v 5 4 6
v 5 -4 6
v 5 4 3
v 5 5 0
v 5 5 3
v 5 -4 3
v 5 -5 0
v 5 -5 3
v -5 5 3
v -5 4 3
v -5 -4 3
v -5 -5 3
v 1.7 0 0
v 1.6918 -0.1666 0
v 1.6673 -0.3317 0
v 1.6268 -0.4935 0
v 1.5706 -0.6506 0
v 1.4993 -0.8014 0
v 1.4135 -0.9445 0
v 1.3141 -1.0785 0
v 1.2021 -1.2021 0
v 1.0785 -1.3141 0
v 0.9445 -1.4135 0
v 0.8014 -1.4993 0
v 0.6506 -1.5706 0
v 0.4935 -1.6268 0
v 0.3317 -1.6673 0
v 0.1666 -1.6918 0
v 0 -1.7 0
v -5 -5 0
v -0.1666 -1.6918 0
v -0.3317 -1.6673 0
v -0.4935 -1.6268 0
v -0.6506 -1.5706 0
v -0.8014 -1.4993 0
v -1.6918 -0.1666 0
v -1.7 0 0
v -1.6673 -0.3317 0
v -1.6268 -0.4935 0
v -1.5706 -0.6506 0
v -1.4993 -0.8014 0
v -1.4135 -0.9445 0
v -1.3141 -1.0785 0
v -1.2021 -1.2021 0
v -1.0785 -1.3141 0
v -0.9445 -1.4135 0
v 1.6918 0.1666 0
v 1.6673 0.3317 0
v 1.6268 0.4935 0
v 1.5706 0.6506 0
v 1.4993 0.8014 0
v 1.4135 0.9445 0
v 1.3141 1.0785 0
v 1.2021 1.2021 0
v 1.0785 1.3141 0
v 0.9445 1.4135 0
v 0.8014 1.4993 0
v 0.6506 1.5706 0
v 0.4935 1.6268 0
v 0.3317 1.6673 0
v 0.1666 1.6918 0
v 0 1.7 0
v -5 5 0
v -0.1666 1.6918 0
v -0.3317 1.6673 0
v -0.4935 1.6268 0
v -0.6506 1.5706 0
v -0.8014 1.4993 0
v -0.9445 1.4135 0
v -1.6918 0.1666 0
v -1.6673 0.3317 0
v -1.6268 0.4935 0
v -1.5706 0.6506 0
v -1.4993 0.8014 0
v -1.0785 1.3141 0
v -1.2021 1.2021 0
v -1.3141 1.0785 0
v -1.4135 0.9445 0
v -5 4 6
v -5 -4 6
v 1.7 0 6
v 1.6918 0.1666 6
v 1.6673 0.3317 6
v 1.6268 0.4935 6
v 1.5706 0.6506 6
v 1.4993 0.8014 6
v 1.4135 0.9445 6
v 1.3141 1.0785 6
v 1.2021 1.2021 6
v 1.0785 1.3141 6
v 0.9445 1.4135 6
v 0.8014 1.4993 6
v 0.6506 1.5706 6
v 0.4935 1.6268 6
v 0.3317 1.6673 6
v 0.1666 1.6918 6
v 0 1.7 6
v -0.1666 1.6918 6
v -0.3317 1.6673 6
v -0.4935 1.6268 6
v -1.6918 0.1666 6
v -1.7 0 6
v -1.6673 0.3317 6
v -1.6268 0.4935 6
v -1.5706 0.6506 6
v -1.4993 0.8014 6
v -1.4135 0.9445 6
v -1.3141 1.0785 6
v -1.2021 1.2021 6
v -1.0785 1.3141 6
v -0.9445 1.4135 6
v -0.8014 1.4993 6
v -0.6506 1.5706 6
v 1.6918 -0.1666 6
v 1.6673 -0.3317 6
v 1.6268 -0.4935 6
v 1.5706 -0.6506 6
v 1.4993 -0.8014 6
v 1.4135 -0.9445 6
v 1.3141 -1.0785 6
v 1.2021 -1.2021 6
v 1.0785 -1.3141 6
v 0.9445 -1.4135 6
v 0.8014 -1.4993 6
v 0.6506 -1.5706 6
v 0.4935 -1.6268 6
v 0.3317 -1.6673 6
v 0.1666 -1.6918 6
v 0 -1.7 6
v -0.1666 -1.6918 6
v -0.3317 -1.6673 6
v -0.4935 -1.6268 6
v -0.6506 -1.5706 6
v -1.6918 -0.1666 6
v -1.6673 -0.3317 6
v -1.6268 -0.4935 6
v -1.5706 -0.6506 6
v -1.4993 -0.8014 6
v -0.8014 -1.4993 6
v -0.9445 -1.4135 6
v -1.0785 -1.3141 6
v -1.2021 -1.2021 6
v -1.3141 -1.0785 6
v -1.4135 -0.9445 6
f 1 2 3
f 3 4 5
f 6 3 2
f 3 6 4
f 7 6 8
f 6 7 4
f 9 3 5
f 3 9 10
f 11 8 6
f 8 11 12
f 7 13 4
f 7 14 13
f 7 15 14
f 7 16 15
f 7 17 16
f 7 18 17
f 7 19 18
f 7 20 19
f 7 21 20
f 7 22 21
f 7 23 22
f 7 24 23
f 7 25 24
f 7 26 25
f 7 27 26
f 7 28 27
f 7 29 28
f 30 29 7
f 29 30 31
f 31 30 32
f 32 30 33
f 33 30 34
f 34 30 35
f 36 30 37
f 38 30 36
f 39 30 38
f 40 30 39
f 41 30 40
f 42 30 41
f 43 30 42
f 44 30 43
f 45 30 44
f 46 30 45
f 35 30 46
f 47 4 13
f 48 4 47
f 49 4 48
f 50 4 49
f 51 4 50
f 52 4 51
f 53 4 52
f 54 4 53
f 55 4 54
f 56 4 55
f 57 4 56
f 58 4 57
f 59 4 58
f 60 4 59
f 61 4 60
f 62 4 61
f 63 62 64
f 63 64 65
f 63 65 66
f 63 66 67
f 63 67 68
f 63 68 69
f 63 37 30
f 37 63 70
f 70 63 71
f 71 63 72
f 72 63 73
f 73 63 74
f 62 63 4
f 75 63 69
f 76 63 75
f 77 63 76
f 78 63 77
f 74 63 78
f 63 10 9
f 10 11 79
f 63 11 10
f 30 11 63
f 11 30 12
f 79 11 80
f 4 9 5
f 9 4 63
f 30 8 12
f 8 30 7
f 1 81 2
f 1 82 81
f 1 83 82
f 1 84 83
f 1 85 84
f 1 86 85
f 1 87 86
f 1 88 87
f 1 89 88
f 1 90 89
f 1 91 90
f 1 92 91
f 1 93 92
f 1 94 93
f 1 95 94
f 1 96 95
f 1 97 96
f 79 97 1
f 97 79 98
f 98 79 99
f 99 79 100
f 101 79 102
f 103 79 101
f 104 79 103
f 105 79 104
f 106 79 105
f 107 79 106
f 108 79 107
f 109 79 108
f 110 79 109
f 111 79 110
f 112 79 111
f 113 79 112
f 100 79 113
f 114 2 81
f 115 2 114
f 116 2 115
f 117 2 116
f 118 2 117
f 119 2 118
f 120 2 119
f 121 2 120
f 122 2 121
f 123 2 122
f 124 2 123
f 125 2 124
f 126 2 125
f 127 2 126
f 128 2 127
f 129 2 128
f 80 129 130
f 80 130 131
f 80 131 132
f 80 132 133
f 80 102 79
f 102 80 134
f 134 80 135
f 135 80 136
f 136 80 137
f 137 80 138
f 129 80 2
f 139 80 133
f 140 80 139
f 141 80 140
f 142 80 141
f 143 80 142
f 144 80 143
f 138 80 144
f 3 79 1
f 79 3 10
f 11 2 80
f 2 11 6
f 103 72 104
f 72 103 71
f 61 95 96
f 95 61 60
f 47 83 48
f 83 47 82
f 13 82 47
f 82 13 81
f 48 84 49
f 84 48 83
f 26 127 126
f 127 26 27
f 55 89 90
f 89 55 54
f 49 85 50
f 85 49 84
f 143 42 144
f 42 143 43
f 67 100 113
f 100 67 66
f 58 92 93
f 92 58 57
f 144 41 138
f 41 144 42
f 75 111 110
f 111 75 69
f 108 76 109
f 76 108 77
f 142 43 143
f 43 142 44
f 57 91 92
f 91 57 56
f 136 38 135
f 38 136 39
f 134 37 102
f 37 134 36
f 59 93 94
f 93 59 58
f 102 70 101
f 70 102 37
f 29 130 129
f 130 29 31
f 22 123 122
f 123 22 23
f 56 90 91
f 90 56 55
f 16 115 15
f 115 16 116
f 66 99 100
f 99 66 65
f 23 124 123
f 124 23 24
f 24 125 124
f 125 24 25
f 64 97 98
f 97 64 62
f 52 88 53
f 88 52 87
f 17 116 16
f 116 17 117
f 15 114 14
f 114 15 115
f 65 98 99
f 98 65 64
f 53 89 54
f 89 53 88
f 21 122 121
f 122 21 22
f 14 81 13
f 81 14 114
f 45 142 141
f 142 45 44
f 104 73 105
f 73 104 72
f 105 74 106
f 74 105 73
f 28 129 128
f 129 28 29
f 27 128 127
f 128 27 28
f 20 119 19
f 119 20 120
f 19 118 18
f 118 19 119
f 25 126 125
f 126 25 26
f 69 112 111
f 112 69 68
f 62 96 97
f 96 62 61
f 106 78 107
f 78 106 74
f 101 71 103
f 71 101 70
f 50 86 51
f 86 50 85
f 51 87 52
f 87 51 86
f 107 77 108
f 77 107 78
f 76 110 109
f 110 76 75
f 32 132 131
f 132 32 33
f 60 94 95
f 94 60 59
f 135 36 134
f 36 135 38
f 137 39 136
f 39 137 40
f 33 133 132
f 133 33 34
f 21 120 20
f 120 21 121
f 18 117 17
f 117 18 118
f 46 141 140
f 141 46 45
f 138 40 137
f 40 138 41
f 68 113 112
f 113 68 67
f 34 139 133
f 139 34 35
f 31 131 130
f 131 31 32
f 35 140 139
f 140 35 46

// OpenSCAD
// T-slot nut for aluminium extrusion
// Print orientation: flange down on XY plane, neck up (+Z)

$fn = 64;

// ---- Dimensions (mm) ----
nut_length     = 10;   // length along X
flange_width   = 10;   // flange width along Y
flange_height  = 3;    // flange thickness, z = 0 .. 3
neck_width     = 8;    // neck width along Y
neck_top_z     = 6;    // top of neck (z)
hole_d         = 3.4;  // screw clearance hole diameter
overlap        = 0.5;  // cutter overshoot past faces

neck_height = neck_top_z - flange_height;  // neck height (3 mm)

difference() {
    union() {
        // Bottom flange
        translate([-nut_length/2, -flange_width/2, 0])
            cube([nut_length, flange_width, flange_height]);

        // Centred neck, overlapping the flange slightly to fuse
        translate([-nut_length/2, -neck_width/2, flange_height - 0.01])
            cube([nut_length, neck_width, neck_height + 0.01]);
    }

    // Vertical screw hole through the centre
    translate([0, 0, -overlap])
        cylinder(d = hole_d, h = neck_top_z + 2*overlap);
}
